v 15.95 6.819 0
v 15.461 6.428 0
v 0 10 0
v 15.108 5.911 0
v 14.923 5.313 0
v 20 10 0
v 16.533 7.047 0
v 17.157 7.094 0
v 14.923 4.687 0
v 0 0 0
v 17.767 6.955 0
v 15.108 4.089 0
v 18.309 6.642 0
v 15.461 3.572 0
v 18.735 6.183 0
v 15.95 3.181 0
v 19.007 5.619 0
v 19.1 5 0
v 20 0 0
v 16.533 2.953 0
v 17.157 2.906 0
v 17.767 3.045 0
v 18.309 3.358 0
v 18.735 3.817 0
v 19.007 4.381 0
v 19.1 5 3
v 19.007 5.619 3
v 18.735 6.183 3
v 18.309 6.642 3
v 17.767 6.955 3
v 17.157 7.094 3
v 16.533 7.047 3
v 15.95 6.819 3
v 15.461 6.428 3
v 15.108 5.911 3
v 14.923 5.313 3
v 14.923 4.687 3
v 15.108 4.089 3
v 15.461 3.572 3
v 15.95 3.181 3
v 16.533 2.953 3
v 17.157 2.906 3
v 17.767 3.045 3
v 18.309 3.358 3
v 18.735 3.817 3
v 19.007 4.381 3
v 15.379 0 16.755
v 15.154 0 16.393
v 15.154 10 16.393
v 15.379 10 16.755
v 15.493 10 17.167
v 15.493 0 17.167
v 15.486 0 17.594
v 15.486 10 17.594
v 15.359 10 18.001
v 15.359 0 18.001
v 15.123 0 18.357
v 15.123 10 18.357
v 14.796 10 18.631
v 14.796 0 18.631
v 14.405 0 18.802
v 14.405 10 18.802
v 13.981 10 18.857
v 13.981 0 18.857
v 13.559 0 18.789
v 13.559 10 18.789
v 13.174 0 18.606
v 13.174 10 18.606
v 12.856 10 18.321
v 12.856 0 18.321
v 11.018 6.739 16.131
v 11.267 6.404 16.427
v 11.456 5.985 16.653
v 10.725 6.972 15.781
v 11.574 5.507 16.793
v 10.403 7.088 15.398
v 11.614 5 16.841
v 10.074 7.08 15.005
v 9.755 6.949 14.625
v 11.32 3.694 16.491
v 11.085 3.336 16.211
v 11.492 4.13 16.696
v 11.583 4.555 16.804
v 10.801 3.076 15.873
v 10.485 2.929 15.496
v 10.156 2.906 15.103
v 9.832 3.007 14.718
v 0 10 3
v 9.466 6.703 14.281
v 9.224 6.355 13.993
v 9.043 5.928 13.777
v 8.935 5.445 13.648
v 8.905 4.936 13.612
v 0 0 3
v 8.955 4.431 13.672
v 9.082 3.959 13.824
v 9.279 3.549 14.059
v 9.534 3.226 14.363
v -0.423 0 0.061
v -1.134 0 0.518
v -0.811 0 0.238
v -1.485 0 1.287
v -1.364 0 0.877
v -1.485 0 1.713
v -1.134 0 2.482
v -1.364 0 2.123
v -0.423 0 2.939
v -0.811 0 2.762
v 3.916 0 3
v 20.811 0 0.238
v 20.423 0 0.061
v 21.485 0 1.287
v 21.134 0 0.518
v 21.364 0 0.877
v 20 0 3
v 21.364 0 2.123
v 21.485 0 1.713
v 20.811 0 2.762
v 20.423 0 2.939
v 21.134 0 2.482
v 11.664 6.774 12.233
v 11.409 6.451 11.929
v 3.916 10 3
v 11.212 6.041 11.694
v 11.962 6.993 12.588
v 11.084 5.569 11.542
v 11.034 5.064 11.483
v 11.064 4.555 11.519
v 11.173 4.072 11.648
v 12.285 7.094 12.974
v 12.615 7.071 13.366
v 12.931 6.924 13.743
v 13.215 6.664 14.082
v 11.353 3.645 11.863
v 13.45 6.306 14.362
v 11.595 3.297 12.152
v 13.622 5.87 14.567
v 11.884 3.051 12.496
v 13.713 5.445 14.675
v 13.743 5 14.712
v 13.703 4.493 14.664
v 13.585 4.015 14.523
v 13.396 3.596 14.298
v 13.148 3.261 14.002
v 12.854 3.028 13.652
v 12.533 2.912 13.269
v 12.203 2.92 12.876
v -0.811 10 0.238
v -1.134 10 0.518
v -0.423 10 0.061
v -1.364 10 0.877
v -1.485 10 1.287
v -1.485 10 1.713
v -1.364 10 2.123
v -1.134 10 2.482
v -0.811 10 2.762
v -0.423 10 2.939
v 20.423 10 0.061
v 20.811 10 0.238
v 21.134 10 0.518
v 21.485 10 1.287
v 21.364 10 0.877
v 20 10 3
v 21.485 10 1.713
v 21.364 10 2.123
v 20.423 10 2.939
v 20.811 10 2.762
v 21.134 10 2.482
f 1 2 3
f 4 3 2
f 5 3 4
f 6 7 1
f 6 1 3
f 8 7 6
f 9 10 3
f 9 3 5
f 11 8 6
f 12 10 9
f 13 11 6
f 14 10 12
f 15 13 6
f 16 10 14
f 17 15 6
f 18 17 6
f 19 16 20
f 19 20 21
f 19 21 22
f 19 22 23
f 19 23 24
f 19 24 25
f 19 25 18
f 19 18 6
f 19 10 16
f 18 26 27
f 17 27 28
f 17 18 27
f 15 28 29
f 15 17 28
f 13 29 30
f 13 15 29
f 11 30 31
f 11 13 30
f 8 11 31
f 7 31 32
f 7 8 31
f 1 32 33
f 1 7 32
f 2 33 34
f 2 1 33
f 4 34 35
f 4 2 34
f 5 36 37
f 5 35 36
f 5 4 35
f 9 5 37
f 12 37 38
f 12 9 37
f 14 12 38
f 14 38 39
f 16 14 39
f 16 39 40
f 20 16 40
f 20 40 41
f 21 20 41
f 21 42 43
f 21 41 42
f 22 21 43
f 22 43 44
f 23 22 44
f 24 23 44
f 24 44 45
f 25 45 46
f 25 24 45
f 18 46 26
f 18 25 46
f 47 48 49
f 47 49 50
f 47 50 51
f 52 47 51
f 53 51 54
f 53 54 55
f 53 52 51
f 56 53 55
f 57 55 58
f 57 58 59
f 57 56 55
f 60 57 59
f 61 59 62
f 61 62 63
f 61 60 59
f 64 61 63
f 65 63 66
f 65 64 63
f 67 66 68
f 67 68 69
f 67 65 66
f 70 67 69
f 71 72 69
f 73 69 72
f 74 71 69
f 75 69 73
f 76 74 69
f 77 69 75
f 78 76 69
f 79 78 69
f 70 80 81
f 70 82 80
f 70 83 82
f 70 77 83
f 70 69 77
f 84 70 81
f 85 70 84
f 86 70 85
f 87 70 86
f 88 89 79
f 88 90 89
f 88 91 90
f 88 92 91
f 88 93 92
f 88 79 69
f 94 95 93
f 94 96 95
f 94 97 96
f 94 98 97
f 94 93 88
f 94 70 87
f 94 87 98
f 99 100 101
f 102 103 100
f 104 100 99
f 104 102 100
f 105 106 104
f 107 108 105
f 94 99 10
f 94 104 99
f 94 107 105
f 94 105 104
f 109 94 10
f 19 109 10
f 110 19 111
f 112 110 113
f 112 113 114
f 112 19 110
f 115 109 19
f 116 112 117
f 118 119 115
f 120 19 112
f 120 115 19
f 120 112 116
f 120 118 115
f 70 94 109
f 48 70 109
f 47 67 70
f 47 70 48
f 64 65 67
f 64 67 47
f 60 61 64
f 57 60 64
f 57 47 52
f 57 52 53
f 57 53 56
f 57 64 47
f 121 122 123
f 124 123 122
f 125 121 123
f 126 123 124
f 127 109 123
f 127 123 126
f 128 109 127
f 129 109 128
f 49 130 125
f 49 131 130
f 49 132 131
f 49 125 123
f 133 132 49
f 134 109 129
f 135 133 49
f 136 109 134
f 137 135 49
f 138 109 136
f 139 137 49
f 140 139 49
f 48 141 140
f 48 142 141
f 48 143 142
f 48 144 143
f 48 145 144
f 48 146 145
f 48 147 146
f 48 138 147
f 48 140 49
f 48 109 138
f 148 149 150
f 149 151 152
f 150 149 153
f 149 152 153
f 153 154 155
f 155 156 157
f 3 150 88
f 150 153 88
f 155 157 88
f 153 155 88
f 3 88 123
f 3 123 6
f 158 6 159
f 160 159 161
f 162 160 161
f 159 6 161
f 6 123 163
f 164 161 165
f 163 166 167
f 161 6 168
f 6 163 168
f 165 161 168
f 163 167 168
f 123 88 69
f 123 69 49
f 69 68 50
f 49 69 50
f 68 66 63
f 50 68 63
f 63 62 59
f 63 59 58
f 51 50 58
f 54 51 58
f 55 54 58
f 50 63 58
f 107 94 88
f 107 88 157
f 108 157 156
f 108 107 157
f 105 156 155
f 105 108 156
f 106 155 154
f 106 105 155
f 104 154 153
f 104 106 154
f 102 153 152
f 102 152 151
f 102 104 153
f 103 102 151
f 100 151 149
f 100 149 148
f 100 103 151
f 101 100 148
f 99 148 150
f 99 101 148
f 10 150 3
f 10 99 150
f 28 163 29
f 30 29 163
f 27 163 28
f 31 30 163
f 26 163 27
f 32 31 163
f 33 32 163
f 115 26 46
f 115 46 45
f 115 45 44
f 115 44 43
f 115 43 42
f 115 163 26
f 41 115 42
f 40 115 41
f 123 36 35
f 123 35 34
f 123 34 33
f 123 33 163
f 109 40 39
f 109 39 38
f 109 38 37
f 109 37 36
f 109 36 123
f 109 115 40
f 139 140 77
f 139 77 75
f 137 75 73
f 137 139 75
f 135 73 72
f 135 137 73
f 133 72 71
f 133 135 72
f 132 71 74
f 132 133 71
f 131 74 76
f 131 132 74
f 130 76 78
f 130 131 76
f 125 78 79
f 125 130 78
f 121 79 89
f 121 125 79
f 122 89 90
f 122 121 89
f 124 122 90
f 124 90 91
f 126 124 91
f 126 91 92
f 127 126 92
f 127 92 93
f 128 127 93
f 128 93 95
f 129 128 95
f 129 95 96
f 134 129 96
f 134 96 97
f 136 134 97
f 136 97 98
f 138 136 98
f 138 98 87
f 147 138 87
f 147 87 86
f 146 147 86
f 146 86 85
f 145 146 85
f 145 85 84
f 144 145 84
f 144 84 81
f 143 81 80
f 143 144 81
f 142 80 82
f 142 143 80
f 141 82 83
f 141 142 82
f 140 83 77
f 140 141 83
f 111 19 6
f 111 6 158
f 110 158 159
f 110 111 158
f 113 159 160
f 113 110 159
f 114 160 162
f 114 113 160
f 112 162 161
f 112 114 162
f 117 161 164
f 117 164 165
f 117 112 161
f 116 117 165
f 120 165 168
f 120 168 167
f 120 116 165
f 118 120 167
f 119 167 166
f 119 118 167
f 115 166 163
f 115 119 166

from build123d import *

# Parameters (mm, degrees)
CYLINDER001_R               = 2.1
CYLINDER001_DEPTH           = 10
CYLINDER001_PLACEMENT_ANGLE = 45
CYLINDER_R                  = 2.1
CYLINDER_DEPTH              = 10
PAD_DEPTH                   = 10


with BuildPart() as insert_hole001:
    # Cylinder001 → Cylinder001 (new body)
    with BuildSketch(Plane.XY):
        Circle(CYLINDER001_R)
    extrude(amount=CYLINDER001_DEPTH)


with BuildPart() as insert_hole001_1:
    # Cylinder001 placement: moved
    add(insert_hole001.part.moved(Location((15.585786, 5, 9.899495))).rotate(Axis((15.585786, 5, 9.899495), (0, -1, 0)), CYLINDER001_PLACEMENT_ANGLE))


with BuildPart() as hole_fusion:
    # Cylinder → Cylinder (new body)
    with BuildSketch(Plane(origin=(17, 5, 0), x_dir=(1, 0, 0), z_dir=(0, 0, 1))):
        Circle(CYLINDER_R)
    extrude(amount=CYLINDER_DEPTH)

    # Fusion: union insert hole001
    add(insert_hole001_1.part)


with BuildPart() as angle_cut:
    # Sketch → Pad (new body)
    with BuildSketch(Plane.XZ):
        with BuildLine():
            Line((12.855752, 18.320889), (0, 3))
            ThreePointArc((0, 3), (-1.5, 1.5), (0, 0))
            Line((0, 0), (20, 0))
            ThreePointArc((20, 0), (21.5, 1.5), (20, 3))
            Line((20, 3), (3.916222, 3))
            Line((3.916222, 3), (15.153886, 16.392526))
            ThreePointArc((15.153886, 16.392526), (14.969, 18.505774), (12.855752, 18.320889))
        make_face()
    extrude(amount=-PAD_DEPTH)

    # Cut: cut hole fusion
    add(hole_fusion.part, mode=Mode.SUBTRACT)


solid = angle_cut.part
